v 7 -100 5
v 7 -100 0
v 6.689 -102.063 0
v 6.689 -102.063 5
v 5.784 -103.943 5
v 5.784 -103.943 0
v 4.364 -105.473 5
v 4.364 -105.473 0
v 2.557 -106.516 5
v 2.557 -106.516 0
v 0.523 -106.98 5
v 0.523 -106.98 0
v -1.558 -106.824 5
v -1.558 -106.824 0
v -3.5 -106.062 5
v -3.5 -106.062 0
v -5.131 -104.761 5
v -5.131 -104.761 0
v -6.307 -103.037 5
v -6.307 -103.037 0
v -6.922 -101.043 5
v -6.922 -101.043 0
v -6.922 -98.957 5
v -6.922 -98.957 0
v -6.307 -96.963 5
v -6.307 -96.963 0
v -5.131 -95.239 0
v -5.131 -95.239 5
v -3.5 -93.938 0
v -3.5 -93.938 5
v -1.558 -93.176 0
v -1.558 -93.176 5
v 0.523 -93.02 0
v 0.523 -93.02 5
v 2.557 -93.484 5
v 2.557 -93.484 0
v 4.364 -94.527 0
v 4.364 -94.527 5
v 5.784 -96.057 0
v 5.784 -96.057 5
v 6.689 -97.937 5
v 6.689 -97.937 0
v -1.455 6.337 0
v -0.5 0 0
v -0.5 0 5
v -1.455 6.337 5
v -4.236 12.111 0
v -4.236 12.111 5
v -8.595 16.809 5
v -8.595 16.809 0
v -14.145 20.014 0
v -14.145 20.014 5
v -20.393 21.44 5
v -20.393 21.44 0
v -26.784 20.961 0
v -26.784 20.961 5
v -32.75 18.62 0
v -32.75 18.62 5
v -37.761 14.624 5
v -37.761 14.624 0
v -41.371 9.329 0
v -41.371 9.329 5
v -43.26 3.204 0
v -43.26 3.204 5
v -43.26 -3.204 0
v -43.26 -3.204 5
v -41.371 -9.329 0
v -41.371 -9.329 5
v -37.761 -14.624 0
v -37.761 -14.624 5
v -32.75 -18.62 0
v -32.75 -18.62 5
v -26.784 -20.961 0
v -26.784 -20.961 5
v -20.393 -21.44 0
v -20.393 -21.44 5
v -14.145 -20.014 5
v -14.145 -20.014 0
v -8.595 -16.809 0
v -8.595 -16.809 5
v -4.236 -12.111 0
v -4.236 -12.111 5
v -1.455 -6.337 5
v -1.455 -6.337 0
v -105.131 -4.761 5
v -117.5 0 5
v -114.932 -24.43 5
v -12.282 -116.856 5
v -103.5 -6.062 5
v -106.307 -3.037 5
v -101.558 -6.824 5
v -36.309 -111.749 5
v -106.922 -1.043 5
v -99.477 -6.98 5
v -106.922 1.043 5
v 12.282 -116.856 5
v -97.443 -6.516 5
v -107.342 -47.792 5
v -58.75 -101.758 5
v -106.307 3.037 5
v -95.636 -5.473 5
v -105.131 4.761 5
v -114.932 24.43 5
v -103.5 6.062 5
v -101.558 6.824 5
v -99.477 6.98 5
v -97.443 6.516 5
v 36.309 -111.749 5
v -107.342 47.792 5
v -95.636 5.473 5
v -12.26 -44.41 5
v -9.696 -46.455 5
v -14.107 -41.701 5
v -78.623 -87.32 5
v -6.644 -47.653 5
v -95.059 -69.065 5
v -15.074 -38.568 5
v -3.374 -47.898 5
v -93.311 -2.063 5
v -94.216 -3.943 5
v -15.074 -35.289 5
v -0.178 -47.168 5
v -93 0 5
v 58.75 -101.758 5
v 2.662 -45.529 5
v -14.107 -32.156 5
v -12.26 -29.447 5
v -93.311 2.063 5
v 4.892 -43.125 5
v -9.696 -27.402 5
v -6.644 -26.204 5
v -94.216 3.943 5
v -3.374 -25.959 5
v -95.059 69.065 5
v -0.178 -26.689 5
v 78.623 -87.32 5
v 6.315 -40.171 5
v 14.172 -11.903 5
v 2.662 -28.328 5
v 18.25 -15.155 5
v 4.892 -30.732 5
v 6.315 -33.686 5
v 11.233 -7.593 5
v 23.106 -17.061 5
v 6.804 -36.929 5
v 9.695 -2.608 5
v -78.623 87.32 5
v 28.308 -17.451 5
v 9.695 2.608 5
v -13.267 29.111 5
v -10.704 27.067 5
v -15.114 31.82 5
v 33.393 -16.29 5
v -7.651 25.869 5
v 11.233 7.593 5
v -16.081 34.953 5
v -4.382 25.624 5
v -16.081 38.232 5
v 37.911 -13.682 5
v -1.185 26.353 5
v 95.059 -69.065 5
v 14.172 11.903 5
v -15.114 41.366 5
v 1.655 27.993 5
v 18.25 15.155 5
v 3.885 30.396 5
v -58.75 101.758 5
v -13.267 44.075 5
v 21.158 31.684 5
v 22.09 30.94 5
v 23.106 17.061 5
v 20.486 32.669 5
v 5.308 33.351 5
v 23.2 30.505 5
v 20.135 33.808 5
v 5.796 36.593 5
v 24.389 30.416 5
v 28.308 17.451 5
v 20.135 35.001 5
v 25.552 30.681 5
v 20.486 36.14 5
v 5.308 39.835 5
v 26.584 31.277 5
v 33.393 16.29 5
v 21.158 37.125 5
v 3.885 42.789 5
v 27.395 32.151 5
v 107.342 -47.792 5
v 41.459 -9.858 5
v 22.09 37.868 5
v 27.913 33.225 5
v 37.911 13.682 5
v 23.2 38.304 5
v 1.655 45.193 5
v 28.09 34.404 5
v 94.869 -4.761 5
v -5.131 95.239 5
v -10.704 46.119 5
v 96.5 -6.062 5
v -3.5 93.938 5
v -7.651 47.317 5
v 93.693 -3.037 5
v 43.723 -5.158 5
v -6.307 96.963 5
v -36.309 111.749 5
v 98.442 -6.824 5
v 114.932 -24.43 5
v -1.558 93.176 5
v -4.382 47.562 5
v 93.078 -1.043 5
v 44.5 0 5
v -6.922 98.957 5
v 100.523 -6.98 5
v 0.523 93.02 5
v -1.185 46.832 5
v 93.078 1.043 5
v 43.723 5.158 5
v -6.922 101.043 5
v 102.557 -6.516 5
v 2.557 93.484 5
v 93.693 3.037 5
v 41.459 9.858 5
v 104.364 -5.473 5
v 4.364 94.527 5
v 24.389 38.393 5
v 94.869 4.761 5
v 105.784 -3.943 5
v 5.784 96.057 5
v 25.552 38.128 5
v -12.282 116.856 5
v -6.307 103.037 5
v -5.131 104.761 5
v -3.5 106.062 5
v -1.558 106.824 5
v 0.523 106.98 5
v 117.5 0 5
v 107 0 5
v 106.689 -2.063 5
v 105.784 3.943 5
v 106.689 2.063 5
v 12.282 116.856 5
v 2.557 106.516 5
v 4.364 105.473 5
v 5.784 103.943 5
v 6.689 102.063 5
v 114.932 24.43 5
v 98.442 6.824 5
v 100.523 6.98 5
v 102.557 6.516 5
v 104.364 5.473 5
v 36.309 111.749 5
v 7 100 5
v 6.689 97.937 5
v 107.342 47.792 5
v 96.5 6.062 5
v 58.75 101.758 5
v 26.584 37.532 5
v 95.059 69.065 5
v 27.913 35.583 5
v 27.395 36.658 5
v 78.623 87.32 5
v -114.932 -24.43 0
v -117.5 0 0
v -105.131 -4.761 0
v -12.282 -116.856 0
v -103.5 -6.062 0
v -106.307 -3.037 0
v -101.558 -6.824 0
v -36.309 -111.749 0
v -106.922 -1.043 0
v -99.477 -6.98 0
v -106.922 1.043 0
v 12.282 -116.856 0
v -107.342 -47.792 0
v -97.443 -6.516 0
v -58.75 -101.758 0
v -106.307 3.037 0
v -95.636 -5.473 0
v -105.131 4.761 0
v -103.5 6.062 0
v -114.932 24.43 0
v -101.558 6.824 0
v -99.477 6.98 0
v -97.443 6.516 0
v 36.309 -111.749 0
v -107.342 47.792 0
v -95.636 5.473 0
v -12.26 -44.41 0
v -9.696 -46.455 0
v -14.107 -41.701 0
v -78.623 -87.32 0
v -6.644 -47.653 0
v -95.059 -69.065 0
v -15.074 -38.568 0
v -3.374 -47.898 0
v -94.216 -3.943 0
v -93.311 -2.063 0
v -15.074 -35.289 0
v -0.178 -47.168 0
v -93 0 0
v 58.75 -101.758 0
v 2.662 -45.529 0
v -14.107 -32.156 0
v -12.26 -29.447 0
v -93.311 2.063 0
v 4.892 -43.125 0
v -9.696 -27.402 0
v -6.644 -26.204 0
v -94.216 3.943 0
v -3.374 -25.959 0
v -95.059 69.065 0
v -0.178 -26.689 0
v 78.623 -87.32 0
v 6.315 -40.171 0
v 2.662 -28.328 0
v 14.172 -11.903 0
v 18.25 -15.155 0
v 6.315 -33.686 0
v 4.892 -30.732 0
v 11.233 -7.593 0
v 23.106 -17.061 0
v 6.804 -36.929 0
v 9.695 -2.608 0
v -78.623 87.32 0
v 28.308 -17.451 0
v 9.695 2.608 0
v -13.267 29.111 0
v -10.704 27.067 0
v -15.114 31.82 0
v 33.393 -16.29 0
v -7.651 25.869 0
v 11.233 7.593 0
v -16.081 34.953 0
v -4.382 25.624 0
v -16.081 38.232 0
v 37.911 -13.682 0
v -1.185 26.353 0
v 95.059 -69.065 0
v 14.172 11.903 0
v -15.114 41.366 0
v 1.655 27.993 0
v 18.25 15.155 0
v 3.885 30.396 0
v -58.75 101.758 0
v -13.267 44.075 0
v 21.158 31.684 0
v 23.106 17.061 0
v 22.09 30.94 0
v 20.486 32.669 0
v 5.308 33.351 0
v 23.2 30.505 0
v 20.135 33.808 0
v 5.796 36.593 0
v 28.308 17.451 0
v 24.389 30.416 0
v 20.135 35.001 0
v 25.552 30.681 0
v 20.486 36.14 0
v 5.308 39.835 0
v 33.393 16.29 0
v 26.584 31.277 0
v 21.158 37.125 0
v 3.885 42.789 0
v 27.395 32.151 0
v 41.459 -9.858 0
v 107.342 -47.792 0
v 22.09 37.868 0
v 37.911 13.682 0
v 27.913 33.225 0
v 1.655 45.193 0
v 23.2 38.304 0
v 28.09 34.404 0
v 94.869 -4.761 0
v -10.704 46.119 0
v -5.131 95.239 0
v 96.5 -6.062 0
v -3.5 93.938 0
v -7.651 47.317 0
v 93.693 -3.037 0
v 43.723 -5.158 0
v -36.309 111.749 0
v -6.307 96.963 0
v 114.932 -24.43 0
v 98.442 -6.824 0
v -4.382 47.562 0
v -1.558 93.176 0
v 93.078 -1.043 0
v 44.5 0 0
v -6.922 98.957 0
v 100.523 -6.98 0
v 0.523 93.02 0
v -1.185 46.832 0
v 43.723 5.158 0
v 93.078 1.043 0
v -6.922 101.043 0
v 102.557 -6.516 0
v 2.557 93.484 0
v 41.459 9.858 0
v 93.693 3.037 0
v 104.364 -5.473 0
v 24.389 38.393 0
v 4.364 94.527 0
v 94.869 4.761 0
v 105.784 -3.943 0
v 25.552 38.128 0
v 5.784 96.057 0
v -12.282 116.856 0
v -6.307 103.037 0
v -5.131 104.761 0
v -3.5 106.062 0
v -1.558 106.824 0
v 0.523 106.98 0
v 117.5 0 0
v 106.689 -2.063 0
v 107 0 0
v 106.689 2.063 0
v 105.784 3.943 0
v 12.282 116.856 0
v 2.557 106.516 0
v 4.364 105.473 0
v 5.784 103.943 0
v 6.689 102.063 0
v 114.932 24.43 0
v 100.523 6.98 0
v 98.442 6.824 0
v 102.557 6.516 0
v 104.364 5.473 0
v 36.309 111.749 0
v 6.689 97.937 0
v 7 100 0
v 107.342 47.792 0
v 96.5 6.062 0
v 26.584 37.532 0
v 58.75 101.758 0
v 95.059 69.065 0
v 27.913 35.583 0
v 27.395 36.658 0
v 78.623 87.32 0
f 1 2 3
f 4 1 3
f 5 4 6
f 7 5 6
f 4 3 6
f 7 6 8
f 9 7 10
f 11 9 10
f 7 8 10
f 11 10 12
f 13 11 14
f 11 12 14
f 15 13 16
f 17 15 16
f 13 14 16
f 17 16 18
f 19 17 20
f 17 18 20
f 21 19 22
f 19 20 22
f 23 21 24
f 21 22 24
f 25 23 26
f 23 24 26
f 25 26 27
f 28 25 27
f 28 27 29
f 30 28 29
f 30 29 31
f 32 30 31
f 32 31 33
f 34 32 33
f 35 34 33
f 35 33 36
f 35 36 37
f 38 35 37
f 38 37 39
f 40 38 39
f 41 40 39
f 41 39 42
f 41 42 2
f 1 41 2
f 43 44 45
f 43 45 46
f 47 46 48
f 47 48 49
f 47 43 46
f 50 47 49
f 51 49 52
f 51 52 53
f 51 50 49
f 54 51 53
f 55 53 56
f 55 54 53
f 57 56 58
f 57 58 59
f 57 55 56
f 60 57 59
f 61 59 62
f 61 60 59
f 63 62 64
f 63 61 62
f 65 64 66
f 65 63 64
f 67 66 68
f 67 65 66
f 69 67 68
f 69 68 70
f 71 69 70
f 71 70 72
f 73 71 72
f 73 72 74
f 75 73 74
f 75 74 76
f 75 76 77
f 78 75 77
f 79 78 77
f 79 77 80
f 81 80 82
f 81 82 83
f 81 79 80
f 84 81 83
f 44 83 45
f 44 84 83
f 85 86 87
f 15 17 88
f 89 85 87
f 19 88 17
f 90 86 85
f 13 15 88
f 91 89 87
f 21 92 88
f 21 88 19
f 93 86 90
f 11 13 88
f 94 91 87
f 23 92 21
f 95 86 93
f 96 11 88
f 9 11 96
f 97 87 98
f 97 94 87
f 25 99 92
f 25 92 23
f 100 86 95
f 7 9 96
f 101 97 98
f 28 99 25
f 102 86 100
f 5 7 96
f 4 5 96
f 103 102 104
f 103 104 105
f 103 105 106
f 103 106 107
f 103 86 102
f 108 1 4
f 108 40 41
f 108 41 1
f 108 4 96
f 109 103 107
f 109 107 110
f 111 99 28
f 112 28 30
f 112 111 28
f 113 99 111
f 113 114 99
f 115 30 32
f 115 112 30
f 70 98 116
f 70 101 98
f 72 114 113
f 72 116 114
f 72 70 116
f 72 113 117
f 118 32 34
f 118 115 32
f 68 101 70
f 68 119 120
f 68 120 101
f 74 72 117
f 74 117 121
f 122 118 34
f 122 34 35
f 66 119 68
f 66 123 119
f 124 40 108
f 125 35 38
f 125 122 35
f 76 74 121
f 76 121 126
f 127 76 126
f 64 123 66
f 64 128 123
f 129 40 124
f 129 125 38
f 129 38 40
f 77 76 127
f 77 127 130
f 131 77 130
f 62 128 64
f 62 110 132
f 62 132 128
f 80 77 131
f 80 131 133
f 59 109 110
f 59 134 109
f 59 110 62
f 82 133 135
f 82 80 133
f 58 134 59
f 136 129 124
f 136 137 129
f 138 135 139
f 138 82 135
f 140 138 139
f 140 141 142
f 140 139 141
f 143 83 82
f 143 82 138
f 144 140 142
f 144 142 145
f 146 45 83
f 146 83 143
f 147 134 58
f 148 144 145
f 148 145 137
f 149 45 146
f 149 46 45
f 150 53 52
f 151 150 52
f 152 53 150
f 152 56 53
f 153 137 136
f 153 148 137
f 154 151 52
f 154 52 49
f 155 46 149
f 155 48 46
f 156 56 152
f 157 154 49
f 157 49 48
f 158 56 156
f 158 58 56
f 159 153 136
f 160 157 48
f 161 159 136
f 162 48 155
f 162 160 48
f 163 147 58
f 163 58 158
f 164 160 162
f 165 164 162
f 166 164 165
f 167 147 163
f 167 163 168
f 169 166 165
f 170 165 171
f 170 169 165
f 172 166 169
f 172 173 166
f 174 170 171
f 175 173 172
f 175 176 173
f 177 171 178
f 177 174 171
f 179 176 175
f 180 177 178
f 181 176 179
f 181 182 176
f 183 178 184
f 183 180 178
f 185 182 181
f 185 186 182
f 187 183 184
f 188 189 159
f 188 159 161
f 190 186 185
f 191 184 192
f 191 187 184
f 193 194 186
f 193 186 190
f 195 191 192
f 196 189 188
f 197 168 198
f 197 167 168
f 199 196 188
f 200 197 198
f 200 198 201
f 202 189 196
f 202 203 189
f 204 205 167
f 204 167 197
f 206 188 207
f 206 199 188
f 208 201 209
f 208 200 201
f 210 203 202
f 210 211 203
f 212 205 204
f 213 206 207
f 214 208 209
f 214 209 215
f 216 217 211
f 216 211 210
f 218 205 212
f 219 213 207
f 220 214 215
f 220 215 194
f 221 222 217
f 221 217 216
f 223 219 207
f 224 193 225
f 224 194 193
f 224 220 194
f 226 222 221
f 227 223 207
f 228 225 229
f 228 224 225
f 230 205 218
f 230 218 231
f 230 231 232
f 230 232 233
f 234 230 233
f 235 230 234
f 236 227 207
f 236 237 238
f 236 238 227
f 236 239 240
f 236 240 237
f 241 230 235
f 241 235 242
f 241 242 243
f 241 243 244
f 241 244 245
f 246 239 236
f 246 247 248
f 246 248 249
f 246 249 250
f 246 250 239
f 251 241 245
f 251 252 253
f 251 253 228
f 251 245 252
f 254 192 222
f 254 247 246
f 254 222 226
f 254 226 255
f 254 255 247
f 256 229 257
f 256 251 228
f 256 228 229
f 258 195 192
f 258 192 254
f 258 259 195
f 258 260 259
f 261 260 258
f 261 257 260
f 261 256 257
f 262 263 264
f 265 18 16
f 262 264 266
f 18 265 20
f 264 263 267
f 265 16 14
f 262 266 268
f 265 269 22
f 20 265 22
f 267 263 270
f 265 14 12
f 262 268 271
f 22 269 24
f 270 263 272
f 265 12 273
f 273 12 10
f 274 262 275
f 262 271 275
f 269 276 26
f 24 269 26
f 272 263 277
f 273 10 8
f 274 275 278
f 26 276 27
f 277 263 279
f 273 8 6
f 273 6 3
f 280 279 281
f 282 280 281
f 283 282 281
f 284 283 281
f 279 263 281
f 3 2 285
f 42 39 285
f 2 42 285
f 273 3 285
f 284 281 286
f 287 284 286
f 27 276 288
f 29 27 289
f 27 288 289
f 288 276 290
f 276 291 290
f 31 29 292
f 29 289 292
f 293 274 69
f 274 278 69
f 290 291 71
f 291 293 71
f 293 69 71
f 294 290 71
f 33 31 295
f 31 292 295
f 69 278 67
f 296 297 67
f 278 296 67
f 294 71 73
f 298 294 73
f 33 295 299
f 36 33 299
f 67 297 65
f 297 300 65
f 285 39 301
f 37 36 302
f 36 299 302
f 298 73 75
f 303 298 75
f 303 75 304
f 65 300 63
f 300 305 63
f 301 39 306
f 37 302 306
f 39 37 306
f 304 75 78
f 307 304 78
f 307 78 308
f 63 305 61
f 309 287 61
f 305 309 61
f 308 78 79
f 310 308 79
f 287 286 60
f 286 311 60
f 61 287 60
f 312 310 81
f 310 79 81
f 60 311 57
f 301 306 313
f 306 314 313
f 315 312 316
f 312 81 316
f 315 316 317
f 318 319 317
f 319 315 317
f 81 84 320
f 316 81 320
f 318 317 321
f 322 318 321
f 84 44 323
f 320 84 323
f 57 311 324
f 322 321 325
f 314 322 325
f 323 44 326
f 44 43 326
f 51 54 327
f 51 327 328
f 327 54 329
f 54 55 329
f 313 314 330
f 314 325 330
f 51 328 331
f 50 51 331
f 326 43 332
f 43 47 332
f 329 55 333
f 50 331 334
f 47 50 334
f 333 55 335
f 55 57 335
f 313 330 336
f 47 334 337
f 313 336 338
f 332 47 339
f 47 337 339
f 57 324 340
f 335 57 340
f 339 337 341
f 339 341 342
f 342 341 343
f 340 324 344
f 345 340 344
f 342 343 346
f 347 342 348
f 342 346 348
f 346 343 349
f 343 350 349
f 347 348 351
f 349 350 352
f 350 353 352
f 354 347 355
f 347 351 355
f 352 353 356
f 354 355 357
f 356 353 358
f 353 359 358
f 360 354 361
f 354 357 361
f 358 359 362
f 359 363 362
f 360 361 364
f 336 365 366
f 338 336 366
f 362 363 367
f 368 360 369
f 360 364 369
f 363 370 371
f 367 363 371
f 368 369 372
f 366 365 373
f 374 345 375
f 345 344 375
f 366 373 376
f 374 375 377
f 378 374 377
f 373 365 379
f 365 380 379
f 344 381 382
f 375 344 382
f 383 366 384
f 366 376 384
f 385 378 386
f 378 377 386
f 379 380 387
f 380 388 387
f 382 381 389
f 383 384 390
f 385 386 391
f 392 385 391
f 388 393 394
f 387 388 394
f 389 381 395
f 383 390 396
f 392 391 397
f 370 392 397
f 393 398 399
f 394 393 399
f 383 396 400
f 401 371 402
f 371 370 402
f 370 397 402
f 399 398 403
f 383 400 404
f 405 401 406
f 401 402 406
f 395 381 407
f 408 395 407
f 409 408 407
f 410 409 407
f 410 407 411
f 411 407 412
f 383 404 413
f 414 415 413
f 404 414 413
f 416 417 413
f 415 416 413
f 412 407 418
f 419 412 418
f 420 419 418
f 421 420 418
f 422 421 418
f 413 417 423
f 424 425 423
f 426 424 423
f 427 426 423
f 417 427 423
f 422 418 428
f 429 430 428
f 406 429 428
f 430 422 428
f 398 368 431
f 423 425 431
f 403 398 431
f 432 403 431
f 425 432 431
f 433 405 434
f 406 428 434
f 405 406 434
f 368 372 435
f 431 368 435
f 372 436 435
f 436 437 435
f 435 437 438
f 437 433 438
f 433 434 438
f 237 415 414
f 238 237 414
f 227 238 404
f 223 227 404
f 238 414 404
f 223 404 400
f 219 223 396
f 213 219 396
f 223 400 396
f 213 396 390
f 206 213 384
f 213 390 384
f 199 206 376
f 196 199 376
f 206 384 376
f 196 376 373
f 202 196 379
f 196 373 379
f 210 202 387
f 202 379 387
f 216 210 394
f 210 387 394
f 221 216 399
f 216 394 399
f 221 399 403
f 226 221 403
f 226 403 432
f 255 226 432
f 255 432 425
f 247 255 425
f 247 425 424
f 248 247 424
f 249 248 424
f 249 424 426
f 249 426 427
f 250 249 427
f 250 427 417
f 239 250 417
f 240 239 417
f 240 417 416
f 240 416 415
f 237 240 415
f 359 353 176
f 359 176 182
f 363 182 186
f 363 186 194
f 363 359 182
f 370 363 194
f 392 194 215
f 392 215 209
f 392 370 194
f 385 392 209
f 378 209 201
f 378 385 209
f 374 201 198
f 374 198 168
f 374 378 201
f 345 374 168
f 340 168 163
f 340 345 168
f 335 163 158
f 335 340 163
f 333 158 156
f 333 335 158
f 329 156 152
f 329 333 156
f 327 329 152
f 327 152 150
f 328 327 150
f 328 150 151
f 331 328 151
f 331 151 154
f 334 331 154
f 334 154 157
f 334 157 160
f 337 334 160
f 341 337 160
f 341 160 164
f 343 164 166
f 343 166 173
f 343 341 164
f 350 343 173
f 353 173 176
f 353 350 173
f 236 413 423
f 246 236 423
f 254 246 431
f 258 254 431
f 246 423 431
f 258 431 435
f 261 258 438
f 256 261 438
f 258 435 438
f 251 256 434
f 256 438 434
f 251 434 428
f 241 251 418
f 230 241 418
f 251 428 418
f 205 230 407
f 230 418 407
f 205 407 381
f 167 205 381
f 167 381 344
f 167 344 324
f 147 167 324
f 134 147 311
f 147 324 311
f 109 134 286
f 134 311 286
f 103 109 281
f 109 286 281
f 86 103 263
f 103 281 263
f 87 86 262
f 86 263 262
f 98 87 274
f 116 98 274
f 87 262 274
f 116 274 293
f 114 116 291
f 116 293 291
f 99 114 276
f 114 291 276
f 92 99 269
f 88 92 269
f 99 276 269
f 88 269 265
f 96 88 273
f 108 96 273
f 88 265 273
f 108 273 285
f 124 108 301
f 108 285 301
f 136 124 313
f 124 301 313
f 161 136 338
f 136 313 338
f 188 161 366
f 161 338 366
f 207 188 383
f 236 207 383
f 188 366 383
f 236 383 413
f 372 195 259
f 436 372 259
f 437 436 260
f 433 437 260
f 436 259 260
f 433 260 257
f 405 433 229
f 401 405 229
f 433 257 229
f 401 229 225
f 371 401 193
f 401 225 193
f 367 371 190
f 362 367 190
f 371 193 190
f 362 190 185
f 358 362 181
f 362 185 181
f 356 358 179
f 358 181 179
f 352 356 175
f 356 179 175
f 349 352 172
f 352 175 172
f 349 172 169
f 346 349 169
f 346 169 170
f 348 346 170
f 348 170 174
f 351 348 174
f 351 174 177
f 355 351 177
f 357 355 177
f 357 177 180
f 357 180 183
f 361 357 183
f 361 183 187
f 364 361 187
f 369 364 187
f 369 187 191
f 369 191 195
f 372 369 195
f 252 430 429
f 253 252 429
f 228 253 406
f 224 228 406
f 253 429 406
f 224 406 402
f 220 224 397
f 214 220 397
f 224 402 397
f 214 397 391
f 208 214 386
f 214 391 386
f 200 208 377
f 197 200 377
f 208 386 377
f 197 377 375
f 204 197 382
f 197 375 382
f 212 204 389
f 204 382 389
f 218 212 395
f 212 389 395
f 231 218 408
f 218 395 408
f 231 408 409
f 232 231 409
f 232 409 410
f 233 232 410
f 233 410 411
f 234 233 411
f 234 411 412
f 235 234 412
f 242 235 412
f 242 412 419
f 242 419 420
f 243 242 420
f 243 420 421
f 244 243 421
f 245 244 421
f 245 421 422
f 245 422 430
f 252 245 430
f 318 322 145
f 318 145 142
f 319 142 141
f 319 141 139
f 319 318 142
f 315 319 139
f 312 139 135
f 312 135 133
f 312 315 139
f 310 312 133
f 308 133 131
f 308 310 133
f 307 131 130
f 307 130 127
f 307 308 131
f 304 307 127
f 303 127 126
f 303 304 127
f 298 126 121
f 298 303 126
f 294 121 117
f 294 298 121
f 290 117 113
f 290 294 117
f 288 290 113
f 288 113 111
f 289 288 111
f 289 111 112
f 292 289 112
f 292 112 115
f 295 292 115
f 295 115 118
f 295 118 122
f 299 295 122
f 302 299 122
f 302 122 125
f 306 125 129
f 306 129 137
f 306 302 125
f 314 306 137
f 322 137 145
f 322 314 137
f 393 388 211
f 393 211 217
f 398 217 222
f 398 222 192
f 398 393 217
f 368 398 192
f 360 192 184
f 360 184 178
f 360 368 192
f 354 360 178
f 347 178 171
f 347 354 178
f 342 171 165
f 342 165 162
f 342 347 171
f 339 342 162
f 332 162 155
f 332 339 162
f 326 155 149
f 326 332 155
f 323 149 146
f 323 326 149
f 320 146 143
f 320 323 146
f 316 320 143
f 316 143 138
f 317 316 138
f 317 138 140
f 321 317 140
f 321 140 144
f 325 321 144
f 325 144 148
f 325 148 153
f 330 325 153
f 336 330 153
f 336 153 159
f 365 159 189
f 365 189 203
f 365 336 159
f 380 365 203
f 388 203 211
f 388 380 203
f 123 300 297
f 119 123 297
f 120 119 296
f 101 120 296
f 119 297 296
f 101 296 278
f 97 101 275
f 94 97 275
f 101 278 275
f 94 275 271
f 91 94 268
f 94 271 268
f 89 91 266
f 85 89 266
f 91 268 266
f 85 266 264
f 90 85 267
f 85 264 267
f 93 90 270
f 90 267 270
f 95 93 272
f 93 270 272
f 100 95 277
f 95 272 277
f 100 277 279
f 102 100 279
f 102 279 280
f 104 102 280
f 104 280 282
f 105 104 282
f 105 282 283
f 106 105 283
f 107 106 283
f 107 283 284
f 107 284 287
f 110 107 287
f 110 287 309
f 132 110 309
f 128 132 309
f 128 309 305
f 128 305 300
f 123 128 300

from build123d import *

# Parameters (mm, degrees)
F0_R     = 117.5
F0_R_2   = 11
F0_R_3   = 21.5
F0_R_4   = 17.5
F1_DEPTH = 5
F2_R     = 7
F3_DEPTH = 5.001
F4_R     = 4
F5_DEPTH = 5.001


with BuildPart() as f1:
    # F0 (on Top) → F1 (new body)
    with BuildSketch(Plane.XY):
        Circle(F0_R)
        with Locations((-4.196429, -36.928568)):
            Circle(F0_R_2, mode=Mode.SUBTRACT)
        with Locations((-22, 0)):
            Circle(F0_R_3, mode=Mode.SUBTRACT)
        with Locations((-5.203568, 36.592856)):
            Circle(F0_R_2, mode=Mode.SUBTRACT)
        with Locations((27, 0)):
            Circle(F0_R_4, mode=Mode.SUBTRACT)
    extrude(amount=F1_DEPTH)

    # F2 (on face) → F3 (cut, through all)
    with BuildSketch(Plane(origin=(0, 0, 0), x_dir=(1, 0, 0), z_dir=(0, 0, -1))):
        with Locations((-100, 0)):
            Circle(F2_R)
        with Locations((0, 100)):
            Circle(F2_R)
        with Locations((100, 0)):
            Circle(F2_R)
        with Locations((0, -100)):
            Circle(F2_R)
    extrude(amount=-F3_DEPTH, mode=Mode.SUBTRACT)

    # F4 (on face) → F5 (cut, through all)
    with BuildSketch(Plane.XY.offset(5)):
        with Locations((24.09021, 34.404386)):
            Circle(F4_R)
    extrude(amount=-F5_DEPTH, mode=Mode.SUBTRACT)


solid = f1.part
